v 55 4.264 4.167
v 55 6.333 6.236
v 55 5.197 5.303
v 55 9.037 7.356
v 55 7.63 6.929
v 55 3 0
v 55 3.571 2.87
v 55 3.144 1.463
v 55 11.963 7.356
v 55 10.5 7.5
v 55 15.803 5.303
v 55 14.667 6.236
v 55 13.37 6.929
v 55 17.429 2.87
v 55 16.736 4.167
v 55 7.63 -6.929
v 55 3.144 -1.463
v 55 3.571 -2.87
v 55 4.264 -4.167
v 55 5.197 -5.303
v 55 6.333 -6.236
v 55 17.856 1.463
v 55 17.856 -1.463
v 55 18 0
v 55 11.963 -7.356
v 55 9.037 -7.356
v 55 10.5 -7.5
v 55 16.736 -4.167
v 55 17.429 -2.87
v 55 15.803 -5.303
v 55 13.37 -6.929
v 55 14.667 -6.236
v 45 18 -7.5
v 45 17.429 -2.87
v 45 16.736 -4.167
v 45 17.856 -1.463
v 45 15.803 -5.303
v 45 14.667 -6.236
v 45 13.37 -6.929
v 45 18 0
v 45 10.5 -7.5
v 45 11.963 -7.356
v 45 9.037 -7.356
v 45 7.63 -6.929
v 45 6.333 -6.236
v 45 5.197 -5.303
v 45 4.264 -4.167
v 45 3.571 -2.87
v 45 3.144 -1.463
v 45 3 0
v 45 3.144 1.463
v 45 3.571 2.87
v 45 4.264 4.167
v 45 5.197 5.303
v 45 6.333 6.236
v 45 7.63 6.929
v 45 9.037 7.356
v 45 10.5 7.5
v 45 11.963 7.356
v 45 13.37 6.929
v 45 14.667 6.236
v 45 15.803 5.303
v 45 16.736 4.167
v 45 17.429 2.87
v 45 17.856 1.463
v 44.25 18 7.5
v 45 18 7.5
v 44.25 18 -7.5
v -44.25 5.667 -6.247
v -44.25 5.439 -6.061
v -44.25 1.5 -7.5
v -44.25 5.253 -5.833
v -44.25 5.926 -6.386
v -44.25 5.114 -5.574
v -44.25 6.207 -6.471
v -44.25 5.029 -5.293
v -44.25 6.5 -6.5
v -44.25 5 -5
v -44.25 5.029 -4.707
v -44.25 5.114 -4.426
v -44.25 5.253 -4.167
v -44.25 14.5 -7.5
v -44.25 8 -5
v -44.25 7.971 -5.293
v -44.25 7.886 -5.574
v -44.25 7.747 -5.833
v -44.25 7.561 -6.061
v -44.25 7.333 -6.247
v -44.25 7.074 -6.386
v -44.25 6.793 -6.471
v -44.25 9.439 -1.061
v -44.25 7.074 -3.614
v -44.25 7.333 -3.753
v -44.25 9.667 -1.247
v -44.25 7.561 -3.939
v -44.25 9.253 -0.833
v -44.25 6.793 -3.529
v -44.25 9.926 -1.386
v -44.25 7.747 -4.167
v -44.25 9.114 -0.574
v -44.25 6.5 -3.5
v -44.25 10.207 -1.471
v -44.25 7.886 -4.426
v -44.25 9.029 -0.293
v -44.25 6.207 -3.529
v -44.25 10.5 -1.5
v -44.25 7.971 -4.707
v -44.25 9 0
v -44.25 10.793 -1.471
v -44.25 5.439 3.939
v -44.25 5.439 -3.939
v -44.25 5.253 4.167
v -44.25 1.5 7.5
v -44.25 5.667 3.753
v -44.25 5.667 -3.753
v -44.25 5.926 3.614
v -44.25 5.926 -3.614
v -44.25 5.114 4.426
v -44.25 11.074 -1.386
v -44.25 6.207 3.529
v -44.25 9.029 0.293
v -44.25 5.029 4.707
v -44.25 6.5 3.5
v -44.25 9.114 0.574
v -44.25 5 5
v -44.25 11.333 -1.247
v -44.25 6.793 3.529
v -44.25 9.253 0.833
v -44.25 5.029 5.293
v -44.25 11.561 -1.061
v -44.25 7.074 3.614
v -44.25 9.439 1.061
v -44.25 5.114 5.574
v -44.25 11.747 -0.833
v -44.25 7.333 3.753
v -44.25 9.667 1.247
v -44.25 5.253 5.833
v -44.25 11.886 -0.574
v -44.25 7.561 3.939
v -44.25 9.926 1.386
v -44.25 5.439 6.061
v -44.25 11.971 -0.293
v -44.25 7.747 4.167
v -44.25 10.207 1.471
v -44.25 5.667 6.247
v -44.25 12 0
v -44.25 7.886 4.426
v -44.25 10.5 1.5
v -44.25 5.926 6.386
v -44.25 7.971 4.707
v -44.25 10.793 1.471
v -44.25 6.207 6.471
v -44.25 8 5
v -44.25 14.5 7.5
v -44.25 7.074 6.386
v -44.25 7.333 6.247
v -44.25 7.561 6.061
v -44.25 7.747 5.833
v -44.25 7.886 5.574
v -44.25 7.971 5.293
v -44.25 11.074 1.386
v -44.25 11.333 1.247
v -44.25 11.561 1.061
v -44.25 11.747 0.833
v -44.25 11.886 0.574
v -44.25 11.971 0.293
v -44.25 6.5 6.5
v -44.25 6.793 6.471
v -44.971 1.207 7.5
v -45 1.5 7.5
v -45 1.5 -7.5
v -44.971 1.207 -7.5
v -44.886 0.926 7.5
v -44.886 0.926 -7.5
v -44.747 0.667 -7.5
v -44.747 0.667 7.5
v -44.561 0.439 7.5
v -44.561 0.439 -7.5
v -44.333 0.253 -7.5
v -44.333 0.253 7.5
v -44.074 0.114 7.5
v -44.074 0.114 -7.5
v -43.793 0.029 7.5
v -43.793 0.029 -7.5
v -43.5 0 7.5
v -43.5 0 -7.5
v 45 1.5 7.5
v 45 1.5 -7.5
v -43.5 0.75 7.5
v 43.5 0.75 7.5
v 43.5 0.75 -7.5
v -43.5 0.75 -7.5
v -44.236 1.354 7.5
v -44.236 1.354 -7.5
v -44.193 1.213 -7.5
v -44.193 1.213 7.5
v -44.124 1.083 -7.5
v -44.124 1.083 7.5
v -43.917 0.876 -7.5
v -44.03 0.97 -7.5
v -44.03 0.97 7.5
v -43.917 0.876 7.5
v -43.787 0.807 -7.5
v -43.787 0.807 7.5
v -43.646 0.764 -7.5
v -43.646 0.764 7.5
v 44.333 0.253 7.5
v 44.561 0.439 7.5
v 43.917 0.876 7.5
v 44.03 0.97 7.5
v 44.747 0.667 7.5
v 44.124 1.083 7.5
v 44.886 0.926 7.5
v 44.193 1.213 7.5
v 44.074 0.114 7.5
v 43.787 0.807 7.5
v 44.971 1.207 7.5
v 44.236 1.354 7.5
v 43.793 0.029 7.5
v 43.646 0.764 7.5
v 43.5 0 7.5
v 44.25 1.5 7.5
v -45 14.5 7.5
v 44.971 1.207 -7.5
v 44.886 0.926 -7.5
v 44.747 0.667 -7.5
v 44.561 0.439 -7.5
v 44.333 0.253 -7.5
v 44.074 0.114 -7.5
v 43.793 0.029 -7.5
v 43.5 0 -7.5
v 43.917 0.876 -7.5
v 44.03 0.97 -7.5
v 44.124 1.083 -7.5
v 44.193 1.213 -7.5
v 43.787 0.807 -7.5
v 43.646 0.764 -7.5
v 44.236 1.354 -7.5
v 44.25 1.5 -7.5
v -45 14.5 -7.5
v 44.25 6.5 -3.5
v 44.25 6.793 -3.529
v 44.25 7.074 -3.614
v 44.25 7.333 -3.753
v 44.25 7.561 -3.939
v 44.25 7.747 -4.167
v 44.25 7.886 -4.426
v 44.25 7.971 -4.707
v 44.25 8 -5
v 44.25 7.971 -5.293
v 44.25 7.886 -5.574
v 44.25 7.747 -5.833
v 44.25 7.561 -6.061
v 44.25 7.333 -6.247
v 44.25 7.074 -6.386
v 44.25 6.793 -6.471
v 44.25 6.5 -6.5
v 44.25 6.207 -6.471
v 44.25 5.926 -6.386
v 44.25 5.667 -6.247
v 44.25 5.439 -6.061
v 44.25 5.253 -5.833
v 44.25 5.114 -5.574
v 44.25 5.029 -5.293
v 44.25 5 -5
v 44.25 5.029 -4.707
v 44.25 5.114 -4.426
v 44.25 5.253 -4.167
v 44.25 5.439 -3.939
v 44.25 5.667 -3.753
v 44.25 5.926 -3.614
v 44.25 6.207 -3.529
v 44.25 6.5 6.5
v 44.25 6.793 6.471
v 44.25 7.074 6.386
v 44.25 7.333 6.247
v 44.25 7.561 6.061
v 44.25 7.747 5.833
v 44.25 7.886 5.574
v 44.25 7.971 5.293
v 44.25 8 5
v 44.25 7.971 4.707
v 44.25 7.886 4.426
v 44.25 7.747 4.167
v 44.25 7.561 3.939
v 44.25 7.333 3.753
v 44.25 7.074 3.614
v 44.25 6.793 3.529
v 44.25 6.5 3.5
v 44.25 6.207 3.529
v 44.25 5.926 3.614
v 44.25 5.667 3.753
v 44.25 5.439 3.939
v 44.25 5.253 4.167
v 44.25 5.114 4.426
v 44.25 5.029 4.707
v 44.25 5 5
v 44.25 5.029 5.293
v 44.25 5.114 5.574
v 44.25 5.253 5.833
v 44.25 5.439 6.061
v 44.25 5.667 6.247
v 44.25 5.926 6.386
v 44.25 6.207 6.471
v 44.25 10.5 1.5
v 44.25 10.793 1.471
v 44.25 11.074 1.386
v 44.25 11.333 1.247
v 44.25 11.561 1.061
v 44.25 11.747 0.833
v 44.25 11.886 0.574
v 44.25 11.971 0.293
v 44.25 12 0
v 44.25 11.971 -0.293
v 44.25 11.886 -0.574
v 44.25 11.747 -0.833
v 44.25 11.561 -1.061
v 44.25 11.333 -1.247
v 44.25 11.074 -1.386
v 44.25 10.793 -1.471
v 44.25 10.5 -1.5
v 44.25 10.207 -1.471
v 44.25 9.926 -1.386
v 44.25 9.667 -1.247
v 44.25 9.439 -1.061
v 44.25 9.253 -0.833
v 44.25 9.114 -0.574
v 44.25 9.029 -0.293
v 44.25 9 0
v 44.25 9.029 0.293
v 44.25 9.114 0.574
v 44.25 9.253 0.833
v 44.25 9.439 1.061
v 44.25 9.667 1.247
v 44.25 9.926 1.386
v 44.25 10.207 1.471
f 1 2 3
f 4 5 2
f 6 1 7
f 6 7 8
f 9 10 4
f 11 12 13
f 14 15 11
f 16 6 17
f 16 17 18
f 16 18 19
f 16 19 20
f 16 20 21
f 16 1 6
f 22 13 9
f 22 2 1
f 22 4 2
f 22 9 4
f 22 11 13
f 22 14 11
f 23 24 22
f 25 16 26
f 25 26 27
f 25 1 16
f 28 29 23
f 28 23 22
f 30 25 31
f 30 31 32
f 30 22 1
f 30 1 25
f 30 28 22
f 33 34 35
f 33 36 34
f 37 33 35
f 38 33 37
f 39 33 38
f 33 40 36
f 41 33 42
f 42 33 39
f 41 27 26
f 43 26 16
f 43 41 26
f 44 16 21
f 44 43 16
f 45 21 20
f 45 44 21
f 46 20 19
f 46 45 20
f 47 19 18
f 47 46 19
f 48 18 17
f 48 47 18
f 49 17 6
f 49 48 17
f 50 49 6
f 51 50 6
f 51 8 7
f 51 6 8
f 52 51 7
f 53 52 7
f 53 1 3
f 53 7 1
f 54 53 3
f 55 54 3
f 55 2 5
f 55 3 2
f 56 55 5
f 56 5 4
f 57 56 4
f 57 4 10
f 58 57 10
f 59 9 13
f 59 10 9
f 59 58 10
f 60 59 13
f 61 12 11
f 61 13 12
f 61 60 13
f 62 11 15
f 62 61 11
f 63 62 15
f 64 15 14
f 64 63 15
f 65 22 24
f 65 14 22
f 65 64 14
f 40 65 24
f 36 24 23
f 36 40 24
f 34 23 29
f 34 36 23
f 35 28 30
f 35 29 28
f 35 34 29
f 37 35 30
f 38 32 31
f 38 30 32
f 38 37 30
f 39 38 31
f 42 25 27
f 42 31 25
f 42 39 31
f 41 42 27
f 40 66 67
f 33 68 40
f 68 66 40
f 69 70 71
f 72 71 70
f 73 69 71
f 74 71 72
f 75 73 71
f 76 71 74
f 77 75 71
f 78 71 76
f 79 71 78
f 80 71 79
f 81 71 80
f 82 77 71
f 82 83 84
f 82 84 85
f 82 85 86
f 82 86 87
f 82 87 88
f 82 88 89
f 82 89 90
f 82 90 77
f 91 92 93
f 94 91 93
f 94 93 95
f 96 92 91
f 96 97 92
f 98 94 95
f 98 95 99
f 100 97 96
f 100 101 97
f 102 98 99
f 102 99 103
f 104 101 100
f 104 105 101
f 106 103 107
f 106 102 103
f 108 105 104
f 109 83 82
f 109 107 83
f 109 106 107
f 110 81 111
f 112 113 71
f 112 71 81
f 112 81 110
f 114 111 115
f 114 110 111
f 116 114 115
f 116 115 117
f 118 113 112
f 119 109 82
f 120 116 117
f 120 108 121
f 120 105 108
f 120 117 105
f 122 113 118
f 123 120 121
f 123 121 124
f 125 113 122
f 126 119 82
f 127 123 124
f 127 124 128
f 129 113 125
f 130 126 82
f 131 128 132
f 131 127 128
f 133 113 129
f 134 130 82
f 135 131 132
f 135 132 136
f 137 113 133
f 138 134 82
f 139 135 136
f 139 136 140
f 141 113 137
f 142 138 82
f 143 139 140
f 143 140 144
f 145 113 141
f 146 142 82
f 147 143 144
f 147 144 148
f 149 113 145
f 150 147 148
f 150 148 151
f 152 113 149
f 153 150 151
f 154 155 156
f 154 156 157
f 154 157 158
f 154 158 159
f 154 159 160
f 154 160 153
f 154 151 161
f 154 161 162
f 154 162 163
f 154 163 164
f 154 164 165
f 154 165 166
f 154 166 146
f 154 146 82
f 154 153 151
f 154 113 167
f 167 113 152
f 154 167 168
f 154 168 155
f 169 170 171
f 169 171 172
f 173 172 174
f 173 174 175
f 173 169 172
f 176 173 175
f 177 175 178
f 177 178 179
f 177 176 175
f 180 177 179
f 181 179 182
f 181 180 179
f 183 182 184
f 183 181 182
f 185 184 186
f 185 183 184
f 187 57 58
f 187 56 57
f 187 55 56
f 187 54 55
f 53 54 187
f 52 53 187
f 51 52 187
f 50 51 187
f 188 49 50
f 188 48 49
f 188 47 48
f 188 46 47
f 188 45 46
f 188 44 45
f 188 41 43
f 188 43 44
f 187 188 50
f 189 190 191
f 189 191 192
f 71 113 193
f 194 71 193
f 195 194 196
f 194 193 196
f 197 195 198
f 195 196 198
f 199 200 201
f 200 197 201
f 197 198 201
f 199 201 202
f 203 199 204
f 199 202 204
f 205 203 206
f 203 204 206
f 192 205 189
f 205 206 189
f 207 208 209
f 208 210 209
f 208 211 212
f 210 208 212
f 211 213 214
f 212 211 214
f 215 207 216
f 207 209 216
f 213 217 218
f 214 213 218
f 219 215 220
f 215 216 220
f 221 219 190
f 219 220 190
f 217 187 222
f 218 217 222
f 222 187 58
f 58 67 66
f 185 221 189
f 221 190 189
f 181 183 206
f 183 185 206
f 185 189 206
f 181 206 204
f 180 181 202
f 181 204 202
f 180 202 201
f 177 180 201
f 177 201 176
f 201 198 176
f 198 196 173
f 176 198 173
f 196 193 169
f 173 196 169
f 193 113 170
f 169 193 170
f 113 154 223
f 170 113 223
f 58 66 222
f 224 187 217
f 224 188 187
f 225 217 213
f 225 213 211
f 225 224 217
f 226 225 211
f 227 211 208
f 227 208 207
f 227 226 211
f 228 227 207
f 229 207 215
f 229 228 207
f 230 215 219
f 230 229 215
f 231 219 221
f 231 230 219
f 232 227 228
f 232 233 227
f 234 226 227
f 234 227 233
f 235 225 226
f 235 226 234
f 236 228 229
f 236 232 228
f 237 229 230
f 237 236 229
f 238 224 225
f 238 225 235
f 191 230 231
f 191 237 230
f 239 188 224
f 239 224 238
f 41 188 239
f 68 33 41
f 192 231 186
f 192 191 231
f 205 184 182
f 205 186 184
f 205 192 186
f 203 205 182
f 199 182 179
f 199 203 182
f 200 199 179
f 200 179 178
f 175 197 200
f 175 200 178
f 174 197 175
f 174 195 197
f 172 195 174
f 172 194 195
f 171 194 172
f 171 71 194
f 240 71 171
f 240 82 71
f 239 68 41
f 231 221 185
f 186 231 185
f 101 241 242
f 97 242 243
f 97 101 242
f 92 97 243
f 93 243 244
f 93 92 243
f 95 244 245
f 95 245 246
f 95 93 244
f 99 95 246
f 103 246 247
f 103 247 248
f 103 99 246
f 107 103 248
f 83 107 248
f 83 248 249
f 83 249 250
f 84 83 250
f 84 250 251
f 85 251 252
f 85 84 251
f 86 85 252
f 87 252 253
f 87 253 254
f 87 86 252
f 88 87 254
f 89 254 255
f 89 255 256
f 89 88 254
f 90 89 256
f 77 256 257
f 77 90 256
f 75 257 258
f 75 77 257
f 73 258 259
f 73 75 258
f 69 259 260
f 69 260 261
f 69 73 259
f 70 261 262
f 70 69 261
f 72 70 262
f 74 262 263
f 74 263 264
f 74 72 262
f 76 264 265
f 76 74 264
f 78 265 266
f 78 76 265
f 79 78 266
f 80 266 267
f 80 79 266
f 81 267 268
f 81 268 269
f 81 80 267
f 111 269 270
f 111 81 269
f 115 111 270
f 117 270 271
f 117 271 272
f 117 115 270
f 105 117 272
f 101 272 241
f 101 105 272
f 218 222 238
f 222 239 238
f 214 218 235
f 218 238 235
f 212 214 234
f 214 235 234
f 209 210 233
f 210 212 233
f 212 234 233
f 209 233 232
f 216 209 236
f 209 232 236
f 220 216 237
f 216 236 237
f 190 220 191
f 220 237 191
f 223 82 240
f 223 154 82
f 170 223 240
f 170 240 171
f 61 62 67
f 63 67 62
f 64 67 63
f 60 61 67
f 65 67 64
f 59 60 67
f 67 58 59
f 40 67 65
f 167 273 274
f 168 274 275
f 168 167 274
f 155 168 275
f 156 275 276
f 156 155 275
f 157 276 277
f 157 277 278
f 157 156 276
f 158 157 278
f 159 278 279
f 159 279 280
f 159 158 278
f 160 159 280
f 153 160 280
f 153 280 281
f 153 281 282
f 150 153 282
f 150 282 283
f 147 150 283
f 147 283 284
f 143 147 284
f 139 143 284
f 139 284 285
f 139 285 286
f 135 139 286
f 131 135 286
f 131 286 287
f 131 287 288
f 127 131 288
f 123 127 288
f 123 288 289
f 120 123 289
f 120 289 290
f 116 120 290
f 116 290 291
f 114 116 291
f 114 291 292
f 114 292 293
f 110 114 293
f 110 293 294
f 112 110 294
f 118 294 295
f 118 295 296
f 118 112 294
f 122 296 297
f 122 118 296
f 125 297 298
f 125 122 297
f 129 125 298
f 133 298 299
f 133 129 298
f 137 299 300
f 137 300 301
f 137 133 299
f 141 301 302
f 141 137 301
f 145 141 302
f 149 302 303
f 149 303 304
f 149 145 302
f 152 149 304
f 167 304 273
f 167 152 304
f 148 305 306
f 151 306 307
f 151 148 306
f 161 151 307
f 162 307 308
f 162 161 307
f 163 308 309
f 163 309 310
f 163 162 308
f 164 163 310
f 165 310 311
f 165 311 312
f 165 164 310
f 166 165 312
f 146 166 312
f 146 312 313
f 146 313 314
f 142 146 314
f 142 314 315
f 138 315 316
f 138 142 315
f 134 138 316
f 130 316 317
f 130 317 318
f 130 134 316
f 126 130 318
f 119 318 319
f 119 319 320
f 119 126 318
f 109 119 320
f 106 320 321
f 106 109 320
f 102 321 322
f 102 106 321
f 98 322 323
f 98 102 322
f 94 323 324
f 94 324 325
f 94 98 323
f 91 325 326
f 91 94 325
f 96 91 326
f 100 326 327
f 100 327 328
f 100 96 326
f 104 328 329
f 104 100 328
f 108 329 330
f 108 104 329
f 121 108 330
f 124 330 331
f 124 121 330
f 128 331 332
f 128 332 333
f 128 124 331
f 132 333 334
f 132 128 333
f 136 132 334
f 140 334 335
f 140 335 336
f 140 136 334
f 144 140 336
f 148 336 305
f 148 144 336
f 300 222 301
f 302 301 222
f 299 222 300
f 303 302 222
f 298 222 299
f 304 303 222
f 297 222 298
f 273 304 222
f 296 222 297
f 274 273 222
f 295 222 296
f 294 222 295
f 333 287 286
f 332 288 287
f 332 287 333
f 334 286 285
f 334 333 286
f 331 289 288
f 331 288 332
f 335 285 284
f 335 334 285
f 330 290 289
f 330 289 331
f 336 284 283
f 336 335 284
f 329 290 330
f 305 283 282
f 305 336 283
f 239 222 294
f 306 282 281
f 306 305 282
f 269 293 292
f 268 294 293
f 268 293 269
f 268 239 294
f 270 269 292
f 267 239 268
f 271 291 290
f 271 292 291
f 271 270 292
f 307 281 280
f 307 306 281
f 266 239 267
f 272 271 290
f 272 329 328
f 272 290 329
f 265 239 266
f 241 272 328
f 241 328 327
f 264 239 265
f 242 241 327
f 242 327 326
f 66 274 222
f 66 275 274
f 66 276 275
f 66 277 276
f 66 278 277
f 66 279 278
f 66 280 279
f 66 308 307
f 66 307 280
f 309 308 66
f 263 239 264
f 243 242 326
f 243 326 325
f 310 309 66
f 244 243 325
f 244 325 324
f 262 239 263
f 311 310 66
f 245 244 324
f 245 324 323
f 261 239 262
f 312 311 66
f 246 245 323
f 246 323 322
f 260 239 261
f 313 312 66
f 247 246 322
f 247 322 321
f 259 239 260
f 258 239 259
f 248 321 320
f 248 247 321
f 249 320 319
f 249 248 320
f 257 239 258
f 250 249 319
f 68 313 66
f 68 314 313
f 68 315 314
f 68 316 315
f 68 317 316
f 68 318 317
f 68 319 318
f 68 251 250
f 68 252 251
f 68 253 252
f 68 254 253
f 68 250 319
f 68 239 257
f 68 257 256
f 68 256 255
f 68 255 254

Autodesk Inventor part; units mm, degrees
ref_plane "YZ Plane" through (0, 0, 0) normal (1, 0, 0) x (0, 1, 0)
ref_plane "XZ Plane" through (0, 0, 0) normal (0, 1, 0) x (-1, 0, 0)
ref_plane "XY Plane" through (0, 0, 0) normal (0, 0, 1) x (1, 0, 0)
sketch "Sketch1" plane through (0, 0, 0) normal (0, 1, 0) x (-1, 0, 0)
  line L0 (45, 7.5) -> (-45, 7.5)
  line L1 (-45, 7.5) -> (-45, -7.5)
  line L2 (-45, -7.5) -> (45, -7.5)
  line L3 (45, -7.5) -> (45, 7.5)
  line L4 (45, 7.5) -> (-45, -7.5) construction
  line L5 (-45, 7.5) -> (45, -7.5) construction
  point P0 (0, 0)
  dimension "d0" = 90
  dimension "d1" = 15
extrude "Plate1" add sketch "Sketch1" along normal blind 0.75
sketch "Sketch2" plane through (-44.25, 0, 7.5) normal (-1, 0, 0) x (0, -1, 0)
  line L0 (0, -15) -> (0, 0)
  line L1 (0, 0) -> (-14.5, 0)
  line L2 (-14.5, 0) -> (-14.5, -15)
  line L3 (-14.5, -15) -> (0, -15)
edge flange "Flange1" height 14.5 angle 90 thickness 0.75 bend radius 0.75 thickness toward (-1, 0, 0) relief tear relief width 0.75 relief depth 0.375 edges at (-45, 0.75, 0) wall of the first edge with corners at (-44.25, 0, -7.5) (-44.25, 0, 7.5) (-44.25, 14.5, 7.5) (-44.25, 14.5, -7.5)
bend "Bend1"
corner "Corner1"
sketch "Sketch3" plane through (44.25, 0, -7.5) normal (1, 0, 0) x (0, 1, 0)
  line L0 (0, 15) -> (0, 0)
  line L1 (0, 0) -> (18, 0)
  line L2 (18, 0) -> (18, 15)
  line L3 (18, 15) -> (0, 15)
edge flange "Flange2" height 18 angle 90 thickness 0.75 bend radius 0.75 thickness toward (1, 0, 0) relief tear relief width 0.75 relief depth 0.375 edges at (45, 0.75, 0) wall of the first edge with corners at (44.25, 0, 7.5) (44.25, 0, -7.5) (44.25, 18, -7.5) (44.25, 18, 7.5)
bend "Bend2"
corner "Corner2"
sketch "Sketch4" plane through (45, 18, 7.5) normal (1, 0, 0) x (0, 0, -1)
  circle A0 centre (7.5, -7.5) radius 7.5
  point P0 (7.5, -18)
  dimension "d23" = 10.5
  dimension "d24" = 15
extrude "Extrusion1" add sketch "Sketch4" along normal blind 10
sketch "Sketch5" plane through (-45, 14.5, -7.5) normal (-1, 0, 0) x (0, 0, 1)
  circle A0 centre (7.5, -4) radius 1.5
  circle A1 centre (12.5, -8) radius 1.5
  circle A2 centre (2.5, -8) radius 1.5
  point P0 (7.5, -14.5)
  dimension "d29" = 10.5
  dimension "d30" = 3
  dimension "d31" = 3
  dimension "d32" = 3
  dimension "d33" = 5
  dimension "d34" = 5
  dimension "d35" = 4
extrude "Extrusion2" add sketch "Sketch5" against normal up to surface (89.25 mm away)
equation "\"d34\" = d33"
equation "\"d2\" = Thickness"
equation "\"d3\" = BendReliefWidth"
equation "\"d4\" = BendReliefDepth"
equation "\"d5\" = MinimumRemnant"
equation "\"d6\" = TransitionRadius"
equation "\"d9\" = BendRadius"
equation "\"d10\" = CornerReliefSize"
equation "\"d11\" = GapSize"
equation "\"d12\" = JacobiRadiusSize"
equation "\"d13\" = BendReliefWidth"
equation "\"d14\" = BendReliefDepth"
equation "\"d15\" = MinimumRemnant"
equation "\"d16\" = TransitionRadius"
equation "\"d19\" = BendRadius"
equation "\"d20\" = CornerReliefSize"
equation "\"d21\" = GapSize"
equation "\"d22\" = JacobiRadiusSize"
equation "\"BendRadius\" = Thickness"
equation "\"BendReliefWidth\" = Thickness"
equation "\"BendReliefDepth\" = 0.5 * Thickness"
equation "\"CornerReliefSize\" = 4 * Thickness"
equation "\"MinimumRemnant\" = 2 * Thickness"
equation "\"TransitionRadius\" = BendRadius"
equation "\"JacobiRadiusSize\" = BendRadius"
equation "\"GapSize\" = Thickness"
equation "\"Thickness\" = 0.75"
properties part number "026" material "Stainless Steel, 440C"
